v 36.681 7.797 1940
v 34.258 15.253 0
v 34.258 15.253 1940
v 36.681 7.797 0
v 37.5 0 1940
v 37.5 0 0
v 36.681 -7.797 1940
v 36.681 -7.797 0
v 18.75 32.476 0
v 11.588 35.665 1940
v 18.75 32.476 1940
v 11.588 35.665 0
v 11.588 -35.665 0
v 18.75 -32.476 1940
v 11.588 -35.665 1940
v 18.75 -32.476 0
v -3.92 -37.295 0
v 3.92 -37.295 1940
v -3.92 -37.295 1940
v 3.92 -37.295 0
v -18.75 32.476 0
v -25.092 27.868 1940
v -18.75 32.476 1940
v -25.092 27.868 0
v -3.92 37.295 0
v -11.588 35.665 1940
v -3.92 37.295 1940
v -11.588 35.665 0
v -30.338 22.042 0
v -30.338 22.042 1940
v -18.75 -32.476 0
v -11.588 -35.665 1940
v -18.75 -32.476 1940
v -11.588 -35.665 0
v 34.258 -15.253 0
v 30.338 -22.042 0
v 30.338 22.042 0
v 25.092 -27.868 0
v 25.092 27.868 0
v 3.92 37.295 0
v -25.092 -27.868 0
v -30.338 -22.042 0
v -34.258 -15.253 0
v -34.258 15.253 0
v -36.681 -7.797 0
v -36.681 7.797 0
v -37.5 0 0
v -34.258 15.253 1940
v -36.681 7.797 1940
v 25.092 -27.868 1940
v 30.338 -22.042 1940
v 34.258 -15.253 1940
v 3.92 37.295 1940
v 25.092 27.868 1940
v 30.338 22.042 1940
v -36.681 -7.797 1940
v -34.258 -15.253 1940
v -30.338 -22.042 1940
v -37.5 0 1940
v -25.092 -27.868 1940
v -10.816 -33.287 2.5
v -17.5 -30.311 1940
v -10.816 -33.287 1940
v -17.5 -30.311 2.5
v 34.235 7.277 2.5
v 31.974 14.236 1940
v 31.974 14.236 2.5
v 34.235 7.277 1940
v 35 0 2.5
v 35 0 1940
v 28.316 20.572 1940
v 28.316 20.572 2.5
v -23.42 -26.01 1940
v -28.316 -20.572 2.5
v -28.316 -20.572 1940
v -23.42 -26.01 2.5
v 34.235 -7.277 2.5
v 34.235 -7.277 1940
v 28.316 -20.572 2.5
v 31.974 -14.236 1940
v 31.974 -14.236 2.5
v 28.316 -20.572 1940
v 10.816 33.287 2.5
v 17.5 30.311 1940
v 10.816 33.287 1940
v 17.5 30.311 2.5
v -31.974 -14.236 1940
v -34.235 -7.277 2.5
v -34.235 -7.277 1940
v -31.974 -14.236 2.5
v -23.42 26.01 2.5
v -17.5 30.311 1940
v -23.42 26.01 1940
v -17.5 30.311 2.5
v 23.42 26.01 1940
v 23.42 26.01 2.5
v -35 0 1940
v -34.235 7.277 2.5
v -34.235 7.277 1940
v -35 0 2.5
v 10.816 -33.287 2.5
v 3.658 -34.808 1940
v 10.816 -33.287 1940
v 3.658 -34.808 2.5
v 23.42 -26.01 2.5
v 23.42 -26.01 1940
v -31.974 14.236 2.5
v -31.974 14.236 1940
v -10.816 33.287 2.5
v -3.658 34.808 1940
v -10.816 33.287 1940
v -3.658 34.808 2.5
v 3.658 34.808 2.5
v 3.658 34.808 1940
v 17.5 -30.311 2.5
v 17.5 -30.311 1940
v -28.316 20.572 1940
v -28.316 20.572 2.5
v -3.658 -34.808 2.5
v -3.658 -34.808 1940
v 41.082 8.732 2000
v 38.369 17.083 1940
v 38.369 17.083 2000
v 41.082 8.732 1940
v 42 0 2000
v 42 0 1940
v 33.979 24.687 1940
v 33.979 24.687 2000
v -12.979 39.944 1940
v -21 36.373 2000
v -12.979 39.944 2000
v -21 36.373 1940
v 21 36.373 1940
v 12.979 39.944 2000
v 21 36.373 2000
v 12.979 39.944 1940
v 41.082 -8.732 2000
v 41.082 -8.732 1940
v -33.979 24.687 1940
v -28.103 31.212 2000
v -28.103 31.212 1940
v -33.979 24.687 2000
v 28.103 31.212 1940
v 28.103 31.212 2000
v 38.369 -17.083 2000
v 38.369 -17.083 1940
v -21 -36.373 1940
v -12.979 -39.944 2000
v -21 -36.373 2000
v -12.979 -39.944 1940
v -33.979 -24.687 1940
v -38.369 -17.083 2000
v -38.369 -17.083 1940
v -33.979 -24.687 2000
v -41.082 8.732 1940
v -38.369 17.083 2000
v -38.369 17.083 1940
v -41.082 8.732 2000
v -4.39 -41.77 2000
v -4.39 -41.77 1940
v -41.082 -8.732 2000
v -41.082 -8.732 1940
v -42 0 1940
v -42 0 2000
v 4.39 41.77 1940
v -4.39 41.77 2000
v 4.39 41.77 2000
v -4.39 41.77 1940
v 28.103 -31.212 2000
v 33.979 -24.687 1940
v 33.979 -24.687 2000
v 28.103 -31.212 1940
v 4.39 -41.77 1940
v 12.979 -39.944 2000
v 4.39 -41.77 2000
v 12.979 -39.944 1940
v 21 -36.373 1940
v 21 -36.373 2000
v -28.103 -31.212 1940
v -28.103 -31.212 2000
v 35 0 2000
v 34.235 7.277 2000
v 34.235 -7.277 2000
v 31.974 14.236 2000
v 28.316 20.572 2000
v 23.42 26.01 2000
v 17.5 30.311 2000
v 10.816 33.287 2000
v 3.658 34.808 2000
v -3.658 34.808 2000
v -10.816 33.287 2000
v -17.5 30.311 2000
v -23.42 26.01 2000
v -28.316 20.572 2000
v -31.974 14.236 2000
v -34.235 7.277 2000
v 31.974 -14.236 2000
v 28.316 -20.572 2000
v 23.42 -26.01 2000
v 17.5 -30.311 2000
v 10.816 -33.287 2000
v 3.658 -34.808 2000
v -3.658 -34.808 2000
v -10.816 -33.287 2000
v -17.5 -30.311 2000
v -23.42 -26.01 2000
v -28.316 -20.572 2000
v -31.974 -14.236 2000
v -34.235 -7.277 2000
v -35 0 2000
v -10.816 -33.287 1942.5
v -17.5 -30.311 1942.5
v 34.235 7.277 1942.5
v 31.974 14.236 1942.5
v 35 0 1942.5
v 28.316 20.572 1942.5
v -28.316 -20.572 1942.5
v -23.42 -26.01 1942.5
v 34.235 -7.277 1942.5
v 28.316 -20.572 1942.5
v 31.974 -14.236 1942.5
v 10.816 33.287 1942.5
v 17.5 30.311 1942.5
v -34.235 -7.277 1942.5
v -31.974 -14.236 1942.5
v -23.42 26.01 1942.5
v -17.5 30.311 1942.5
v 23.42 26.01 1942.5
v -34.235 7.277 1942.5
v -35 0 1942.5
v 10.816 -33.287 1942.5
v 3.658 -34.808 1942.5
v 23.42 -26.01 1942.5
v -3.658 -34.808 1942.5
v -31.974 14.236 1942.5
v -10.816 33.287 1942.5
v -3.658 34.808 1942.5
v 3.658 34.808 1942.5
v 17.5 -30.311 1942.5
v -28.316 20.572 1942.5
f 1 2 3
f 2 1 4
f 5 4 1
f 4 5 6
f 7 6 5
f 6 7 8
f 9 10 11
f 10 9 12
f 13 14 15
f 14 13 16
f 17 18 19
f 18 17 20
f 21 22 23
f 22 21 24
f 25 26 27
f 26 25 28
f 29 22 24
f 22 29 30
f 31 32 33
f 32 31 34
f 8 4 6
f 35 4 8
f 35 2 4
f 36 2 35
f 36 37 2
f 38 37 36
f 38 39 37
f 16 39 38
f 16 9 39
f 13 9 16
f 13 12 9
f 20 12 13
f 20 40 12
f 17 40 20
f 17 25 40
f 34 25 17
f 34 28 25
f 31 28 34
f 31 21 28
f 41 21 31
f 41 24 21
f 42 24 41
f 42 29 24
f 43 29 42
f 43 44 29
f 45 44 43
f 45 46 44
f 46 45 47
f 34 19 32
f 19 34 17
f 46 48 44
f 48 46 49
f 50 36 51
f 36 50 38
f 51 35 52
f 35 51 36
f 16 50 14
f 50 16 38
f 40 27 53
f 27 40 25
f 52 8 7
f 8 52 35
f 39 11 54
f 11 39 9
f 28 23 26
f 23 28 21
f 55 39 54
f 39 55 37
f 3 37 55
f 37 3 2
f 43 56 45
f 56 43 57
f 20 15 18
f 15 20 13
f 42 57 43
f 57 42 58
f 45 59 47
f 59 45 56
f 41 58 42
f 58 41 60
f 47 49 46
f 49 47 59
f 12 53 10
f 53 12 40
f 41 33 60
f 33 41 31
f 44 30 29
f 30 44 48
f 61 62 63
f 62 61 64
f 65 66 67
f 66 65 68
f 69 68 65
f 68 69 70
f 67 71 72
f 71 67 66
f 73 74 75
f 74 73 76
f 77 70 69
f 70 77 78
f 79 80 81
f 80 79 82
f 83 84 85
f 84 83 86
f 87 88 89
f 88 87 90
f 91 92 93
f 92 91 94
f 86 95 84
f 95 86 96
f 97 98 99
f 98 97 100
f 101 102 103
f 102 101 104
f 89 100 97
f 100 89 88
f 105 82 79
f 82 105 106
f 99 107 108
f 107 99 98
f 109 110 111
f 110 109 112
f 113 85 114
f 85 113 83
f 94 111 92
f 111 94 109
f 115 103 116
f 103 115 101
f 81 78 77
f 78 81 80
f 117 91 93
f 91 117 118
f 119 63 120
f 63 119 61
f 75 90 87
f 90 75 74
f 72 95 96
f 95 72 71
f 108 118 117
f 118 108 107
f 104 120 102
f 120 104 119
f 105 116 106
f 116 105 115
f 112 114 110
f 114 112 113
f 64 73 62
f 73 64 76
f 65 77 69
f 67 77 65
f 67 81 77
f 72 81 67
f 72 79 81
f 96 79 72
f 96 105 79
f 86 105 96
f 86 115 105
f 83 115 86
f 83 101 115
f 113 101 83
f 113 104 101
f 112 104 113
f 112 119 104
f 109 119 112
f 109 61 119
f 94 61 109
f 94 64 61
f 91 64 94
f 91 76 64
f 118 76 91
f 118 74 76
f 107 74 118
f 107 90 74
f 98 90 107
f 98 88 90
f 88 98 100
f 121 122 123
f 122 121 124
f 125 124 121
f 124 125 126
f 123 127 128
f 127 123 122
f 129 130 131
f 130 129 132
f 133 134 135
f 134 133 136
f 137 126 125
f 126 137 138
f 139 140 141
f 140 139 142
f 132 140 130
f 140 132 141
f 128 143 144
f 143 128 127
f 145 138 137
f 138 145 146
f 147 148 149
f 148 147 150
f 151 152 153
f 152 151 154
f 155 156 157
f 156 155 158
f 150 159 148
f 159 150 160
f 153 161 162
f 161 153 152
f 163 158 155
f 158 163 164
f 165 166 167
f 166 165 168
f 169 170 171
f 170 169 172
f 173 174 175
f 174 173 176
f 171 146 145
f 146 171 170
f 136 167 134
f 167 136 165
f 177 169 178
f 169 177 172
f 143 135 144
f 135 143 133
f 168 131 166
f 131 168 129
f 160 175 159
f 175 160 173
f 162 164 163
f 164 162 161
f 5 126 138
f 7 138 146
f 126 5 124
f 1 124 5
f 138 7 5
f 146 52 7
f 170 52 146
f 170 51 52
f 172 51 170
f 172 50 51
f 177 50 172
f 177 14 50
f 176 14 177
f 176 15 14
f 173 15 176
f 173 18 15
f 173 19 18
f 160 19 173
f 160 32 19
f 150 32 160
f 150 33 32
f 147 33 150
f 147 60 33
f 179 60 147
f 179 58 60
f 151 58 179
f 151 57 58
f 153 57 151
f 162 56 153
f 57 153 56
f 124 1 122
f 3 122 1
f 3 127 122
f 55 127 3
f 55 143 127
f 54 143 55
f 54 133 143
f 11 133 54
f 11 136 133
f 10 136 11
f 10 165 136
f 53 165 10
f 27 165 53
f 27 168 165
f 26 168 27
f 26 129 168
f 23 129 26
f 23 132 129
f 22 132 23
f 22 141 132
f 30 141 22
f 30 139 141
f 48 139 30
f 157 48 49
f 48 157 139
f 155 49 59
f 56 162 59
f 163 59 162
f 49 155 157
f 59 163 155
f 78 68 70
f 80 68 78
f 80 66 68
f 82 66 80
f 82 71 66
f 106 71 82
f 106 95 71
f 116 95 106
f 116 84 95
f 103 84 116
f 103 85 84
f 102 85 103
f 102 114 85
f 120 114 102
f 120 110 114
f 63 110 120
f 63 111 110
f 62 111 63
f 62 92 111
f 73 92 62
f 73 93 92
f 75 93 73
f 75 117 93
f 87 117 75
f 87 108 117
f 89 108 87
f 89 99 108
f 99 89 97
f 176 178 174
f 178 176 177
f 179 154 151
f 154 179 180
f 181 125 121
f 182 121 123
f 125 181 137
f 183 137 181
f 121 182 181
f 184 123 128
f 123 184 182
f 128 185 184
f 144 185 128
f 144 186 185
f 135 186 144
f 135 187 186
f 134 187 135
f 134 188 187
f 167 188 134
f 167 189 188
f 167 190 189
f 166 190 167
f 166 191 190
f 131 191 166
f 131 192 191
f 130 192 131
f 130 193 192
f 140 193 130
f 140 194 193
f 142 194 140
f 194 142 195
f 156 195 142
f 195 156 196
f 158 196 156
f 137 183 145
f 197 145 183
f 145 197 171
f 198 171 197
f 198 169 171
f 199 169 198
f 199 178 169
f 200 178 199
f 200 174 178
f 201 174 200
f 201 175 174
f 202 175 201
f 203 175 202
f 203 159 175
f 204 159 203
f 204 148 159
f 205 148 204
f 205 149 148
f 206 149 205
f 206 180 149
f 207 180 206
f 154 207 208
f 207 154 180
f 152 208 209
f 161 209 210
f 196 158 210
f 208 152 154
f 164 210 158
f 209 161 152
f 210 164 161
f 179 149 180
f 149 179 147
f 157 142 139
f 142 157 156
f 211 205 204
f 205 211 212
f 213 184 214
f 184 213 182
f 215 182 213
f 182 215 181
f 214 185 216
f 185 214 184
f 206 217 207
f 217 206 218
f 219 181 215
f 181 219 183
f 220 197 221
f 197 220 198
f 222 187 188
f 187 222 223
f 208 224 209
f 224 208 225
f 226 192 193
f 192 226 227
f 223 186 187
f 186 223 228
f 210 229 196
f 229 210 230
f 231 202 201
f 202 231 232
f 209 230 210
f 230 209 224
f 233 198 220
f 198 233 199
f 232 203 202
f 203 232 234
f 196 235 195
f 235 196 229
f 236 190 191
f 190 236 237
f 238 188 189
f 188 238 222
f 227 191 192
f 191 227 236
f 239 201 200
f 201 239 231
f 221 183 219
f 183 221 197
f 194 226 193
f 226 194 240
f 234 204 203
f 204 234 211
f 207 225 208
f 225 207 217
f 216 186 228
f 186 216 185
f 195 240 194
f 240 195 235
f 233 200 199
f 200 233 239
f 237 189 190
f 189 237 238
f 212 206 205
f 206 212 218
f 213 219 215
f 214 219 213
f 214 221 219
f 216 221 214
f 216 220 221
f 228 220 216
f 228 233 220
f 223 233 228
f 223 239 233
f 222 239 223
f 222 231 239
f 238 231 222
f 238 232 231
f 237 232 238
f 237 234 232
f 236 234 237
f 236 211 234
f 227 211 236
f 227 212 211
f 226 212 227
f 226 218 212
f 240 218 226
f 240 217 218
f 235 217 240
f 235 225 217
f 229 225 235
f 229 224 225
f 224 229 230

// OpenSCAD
// Parameters
pipe_standard = 0; //[0:0:1]
nominal_diameter_mm = 75; //[40:150:1]
length_mm = 2000; //[1000:4000:10]
pipe_od = 75; //[40:150:1]
pipe_wall = 2.5; //[1.5:5:0.1]
fitting_length = 60; //[30:120:1]
fitting_od_factor = 1.12; //[1.05:1.3:0.01]
overlap = 1; //[0.5:2:0.1]

// HT Pipe - complete geometry
module ht_pipe() {
  color([0.85, 0.85, 0.8]) { // PVC color
    // Pipe segment
    difference() {
      cylinder(h=length_mm - fitting_length + overlap, r=pipe_od/2, center=false);
      translate([0, 0, pipe_wall])
        cylinder(h=length_mm - fitting_length + overlap, r=pipe_od/2 - pipe_wall, center=false);
    }
    
    // Integrated end fitting
    difference() {
      translate([0, 0, length_mm - fitting_length])
        cylinder(h=fitting_length, r=(pipe_od * fitting_od_factor)/2, center=false);
      translate([0, 0, length_mm - fitting_length + pipe_wall])
        cylinder(h=fitting_length, r=pipe_od/2 - pipe_wall, center=false);
    }
  }
}

// Assembly
module assembly() {
  ht_pipe();
}

assembly();
